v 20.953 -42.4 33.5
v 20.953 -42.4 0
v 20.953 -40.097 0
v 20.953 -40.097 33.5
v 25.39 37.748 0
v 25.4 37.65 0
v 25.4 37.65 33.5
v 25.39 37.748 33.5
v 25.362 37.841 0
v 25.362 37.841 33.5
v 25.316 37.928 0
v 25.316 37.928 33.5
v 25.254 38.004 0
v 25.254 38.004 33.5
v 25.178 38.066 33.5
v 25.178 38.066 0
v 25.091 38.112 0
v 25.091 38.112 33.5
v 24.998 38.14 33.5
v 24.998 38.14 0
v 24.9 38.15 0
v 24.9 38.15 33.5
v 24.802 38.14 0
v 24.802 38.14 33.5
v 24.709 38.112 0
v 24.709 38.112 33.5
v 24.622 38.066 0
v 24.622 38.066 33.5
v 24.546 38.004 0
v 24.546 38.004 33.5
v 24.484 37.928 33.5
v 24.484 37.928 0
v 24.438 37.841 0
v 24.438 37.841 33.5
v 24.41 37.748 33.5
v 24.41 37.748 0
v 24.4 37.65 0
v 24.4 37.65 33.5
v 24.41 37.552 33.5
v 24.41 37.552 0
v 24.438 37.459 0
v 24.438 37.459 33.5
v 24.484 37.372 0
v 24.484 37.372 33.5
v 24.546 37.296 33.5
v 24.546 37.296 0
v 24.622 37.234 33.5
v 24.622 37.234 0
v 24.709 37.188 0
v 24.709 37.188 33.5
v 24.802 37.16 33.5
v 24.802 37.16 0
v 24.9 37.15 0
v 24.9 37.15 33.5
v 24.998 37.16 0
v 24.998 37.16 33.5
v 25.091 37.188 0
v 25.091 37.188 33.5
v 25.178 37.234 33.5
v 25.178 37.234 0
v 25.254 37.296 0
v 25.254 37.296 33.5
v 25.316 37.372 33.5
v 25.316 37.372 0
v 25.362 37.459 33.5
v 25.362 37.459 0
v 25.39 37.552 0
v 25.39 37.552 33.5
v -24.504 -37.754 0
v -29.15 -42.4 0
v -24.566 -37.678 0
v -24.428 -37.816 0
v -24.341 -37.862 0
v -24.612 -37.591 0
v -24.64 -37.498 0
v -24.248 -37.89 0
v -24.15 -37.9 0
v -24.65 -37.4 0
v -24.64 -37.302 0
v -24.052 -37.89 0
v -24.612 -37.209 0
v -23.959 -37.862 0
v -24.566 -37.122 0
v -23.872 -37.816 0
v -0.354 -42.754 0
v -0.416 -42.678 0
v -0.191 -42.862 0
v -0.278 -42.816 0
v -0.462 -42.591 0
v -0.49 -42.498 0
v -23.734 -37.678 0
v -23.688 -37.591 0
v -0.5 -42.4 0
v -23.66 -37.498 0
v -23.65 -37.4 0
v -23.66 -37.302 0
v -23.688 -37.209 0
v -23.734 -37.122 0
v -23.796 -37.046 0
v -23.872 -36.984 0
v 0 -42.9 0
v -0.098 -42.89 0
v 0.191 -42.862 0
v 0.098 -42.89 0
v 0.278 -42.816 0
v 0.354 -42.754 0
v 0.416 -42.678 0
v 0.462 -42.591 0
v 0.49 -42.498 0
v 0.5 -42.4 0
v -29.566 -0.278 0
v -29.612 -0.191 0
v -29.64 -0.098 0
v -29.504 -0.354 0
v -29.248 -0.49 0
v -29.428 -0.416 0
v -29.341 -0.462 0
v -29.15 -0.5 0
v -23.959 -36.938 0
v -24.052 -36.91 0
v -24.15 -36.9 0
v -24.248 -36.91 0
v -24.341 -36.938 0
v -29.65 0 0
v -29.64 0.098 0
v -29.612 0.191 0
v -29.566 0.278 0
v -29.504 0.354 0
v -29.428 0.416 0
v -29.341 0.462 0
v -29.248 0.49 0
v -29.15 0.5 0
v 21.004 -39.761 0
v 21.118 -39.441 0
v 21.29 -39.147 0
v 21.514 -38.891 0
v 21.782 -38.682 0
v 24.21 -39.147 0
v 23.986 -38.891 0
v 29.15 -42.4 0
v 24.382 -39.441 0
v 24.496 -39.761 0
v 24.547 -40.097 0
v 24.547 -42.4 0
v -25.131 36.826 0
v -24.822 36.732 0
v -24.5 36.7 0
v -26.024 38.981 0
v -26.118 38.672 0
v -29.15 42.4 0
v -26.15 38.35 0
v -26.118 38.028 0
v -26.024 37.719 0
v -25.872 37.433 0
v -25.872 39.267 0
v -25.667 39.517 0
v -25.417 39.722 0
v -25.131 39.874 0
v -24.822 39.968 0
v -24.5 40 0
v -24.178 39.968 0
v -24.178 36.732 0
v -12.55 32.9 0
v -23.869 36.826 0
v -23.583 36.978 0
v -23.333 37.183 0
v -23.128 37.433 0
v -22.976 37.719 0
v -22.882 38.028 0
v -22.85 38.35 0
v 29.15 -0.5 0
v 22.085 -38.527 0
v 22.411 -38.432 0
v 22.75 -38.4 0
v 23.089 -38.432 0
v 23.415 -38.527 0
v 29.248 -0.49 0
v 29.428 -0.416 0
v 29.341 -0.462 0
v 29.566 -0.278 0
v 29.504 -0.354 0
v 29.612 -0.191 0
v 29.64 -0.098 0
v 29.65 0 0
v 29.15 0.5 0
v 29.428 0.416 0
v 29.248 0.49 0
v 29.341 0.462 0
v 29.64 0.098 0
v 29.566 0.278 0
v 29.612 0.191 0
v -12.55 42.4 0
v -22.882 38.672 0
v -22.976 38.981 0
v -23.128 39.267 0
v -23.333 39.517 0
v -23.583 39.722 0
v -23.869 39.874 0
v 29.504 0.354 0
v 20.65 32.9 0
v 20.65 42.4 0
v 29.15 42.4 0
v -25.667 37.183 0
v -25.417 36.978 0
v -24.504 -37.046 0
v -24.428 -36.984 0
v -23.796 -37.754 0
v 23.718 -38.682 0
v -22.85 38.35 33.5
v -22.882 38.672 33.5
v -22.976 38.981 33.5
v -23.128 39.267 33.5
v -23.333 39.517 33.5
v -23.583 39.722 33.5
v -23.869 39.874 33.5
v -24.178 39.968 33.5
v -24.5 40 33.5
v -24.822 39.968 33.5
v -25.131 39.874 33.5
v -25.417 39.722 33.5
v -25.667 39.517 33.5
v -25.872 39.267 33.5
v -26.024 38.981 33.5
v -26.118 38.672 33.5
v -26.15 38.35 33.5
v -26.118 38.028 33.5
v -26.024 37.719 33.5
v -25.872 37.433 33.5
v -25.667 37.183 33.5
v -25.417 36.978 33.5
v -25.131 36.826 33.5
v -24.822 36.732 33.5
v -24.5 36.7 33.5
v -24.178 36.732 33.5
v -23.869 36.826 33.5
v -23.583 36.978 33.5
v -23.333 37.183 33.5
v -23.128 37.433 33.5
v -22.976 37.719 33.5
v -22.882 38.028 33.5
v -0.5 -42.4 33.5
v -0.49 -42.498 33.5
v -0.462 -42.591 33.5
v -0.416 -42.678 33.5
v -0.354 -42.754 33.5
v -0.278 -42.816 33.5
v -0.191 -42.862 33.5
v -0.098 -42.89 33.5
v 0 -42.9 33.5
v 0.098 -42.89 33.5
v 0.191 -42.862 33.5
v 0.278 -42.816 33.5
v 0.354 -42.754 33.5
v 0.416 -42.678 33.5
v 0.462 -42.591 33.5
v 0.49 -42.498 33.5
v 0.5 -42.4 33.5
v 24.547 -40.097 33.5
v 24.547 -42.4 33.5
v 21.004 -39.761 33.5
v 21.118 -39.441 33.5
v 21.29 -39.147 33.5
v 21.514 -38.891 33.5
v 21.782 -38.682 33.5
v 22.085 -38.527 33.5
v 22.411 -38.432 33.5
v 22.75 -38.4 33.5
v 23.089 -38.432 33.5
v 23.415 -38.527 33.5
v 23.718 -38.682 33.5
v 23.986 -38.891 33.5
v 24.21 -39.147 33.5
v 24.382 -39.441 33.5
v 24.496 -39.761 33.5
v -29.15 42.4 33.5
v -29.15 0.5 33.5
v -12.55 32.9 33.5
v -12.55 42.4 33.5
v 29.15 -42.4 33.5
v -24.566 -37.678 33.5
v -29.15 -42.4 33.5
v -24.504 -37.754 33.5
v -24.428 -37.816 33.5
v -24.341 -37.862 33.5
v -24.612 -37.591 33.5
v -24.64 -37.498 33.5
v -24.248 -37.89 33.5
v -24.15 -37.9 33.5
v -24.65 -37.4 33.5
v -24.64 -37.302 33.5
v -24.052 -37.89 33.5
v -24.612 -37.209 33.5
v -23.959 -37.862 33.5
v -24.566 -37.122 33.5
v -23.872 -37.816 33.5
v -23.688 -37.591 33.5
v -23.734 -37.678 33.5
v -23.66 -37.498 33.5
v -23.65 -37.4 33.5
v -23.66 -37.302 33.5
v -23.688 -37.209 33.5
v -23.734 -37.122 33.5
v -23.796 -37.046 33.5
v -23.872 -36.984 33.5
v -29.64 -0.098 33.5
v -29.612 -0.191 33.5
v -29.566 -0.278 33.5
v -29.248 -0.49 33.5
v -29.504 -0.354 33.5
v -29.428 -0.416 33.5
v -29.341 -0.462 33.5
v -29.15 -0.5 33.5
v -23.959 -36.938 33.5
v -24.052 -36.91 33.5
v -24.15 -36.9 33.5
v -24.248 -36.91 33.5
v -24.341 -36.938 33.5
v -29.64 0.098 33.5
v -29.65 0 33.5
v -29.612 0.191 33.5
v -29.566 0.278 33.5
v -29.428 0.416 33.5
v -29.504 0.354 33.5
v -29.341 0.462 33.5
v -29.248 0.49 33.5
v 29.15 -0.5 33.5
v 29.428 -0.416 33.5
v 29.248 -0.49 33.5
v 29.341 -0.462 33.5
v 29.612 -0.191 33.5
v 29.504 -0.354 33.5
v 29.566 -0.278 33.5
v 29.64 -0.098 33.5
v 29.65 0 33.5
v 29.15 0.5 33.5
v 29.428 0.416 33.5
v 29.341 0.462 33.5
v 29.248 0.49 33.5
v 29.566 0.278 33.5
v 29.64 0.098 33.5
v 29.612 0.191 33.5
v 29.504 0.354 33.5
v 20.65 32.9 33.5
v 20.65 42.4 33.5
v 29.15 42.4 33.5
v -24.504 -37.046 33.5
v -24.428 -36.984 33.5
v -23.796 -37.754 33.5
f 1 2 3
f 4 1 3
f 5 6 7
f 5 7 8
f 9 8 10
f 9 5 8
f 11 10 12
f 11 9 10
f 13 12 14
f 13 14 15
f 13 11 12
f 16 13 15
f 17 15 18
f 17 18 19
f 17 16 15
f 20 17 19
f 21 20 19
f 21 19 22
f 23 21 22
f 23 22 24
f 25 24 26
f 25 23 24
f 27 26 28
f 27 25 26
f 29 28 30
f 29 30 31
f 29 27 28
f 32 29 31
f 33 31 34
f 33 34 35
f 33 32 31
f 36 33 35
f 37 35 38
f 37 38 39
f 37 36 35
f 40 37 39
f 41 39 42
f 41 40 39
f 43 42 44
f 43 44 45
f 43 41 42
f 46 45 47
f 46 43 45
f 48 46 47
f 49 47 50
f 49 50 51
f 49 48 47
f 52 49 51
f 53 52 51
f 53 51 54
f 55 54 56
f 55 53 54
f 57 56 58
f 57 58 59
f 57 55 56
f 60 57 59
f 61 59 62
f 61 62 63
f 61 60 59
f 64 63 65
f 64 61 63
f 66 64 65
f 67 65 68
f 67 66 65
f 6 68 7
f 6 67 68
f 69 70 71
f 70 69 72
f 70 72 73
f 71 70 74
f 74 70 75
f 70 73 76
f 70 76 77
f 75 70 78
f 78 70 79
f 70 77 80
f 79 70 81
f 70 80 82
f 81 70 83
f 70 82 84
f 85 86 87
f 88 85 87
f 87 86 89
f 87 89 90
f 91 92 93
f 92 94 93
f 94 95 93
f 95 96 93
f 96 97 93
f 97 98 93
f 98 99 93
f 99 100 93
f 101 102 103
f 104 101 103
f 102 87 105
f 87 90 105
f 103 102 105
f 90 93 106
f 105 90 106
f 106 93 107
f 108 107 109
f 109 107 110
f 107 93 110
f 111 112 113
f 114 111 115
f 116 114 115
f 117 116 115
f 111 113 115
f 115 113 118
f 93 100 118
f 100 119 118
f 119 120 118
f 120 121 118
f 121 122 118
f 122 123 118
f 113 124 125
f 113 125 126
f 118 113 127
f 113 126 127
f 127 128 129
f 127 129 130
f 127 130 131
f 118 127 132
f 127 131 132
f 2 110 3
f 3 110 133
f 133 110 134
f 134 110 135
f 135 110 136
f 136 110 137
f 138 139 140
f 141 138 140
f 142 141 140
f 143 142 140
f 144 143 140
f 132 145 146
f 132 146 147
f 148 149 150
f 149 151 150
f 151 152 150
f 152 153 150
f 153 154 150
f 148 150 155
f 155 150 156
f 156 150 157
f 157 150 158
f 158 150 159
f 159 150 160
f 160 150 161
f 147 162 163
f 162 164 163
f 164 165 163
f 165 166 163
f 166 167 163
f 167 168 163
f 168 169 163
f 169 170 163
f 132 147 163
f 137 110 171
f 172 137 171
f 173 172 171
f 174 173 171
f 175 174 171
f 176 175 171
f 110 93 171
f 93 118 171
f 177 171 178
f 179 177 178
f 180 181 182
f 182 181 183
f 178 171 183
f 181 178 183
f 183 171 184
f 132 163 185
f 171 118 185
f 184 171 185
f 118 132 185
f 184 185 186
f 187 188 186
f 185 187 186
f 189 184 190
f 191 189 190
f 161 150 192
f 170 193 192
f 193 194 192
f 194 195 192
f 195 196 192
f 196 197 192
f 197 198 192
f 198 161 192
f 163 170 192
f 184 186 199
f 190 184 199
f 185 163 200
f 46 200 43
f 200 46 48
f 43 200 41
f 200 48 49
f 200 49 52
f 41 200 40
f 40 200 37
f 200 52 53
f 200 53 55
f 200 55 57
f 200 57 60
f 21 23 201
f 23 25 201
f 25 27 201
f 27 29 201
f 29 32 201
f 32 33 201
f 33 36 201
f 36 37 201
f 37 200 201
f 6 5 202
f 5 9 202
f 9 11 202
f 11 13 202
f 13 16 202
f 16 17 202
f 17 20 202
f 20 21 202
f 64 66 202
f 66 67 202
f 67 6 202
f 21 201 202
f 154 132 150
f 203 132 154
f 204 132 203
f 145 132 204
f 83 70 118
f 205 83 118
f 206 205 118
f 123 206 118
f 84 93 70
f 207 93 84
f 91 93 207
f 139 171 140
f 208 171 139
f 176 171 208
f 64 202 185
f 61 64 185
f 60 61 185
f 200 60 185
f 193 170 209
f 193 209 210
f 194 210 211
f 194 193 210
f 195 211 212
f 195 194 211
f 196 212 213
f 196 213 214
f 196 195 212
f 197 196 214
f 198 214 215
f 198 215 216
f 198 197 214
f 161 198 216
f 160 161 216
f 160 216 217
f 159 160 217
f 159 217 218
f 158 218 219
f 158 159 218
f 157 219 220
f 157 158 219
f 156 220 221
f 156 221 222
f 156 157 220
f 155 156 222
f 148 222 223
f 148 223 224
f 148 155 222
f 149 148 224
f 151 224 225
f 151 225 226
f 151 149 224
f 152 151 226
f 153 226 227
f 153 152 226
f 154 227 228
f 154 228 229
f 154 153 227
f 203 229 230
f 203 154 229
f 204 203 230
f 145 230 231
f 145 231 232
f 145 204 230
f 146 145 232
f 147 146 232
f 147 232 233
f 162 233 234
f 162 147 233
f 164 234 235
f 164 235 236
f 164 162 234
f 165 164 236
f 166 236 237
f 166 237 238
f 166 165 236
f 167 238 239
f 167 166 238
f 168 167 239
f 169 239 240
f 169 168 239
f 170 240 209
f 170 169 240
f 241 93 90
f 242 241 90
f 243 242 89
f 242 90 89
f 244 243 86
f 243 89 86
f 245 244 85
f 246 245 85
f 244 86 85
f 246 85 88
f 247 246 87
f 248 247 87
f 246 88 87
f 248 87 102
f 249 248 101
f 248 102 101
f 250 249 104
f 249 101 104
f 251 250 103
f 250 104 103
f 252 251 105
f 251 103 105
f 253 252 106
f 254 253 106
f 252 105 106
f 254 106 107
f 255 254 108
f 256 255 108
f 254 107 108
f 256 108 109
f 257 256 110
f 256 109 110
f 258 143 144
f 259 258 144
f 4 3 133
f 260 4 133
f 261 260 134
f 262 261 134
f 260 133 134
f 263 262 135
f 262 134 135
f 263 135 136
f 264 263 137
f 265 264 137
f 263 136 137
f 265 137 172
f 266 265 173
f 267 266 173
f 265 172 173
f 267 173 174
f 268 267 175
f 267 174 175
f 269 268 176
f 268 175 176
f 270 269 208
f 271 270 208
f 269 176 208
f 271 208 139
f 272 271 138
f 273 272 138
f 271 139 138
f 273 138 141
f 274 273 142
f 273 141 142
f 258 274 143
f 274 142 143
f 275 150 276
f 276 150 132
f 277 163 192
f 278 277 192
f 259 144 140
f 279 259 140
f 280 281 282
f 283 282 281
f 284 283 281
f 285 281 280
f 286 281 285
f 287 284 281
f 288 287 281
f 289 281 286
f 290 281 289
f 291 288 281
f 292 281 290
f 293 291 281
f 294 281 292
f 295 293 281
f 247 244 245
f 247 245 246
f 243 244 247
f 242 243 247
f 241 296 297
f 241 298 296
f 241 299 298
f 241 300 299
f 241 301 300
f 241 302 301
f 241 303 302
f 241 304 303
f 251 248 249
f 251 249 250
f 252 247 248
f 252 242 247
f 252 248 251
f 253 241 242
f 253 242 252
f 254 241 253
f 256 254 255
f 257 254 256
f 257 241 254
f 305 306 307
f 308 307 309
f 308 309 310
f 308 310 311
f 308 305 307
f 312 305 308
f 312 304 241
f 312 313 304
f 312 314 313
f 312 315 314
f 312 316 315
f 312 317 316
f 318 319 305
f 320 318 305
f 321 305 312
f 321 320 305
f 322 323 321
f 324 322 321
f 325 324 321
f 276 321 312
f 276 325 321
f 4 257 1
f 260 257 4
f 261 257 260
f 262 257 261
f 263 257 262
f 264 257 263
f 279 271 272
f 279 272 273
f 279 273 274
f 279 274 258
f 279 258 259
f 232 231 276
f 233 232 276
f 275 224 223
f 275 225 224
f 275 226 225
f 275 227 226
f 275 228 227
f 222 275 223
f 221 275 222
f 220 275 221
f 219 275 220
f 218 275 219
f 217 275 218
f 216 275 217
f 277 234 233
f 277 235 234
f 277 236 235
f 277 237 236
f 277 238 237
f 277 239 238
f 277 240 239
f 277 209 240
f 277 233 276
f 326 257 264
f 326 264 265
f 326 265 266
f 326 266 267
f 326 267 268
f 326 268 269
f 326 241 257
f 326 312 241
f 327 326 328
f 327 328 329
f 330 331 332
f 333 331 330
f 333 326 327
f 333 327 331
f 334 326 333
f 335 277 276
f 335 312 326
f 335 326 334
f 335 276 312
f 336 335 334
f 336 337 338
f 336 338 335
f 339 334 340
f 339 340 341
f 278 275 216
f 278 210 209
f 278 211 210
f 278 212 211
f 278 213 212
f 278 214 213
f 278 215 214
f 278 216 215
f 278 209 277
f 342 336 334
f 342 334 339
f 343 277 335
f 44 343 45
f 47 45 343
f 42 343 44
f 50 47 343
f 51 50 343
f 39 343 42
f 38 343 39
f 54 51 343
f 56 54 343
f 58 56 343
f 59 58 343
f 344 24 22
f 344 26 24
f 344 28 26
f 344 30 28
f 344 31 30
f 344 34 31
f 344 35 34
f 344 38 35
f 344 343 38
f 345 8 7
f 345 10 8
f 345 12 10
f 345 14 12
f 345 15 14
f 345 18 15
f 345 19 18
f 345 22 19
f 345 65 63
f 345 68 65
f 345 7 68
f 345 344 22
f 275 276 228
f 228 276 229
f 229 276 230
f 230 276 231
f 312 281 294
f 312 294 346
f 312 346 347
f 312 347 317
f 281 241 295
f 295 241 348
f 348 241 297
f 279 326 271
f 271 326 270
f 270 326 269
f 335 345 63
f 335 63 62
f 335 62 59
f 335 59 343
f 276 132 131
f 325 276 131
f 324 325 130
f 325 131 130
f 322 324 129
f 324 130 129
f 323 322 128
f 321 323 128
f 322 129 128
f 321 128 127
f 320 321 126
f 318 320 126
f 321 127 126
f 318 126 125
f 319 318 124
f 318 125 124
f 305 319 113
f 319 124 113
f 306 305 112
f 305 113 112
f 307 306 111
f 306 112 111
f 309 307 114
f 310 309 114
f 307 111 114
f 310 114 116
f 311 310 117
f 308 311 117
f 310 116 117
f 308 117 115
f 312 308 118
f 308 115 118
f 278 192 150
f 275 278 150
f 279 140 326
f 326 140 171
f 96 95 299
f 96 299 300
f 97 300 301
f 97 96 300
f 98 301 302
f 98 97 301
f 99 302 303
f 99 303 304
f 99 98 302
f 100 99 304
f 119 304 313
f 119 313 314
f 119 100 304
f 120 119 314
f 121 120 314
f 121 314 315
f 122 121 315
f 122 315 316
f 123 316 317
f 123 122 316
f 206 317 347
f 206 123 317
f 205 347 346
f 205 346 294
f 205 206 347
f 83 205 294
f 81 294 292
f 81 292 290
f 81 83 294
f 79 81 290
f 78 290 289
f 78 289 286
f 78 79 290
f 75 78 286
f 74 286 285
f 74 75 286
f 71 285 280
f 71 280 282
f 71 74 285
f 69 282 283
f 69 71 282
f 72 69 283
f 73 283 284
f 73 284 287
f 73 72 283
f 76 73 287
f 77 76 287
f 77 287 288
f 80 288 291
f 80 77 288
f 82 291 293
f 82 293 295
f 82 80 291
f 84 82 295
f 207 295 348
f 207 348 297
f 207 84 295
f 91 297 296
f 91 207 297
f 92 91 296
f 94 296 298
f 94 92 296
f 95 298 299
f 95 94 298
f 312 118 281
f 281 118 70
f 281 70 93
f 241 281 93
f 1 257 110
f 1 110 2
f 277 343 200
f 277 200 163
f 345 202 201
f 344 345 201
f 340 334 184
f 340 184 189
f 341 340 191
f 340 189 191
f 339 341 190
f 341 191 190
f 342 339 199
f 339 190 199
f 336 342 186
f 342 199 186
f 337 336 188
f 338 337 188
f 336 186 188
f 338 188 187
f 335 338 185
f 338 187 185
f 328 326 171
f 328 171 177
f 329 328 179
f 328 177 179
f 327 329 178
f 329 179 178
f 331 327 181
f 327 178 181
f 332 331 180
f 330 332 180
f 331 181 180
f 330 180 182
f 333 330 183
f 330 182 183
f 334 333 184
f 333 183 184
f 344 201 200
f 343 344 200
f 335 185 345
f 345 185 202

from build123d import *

# Parameters (mm, degrees)
F0_R     = 0.5
F0_R_2   = 1.65
F1_DEPTH = 33.5


with BuildPart() as f1:
    # F0 (on Top) → F1 (new body)
    with BuildSketch(Plane.XY):
        with BuildLine():
            Line((-12.55, 42.4), (-29.15, 42.4))
            Line((-29.15, 42.4), (-29.15, 0.5))
            ThreePointArc((-29.15, 0.5), (-28.7964466094, 0.3535533906), (-28.65, 0))
            ThreePointArc((-28.65, 0), (-28.7964466094, -0.3535533906), (-29.15, -0.5))
            Line((-29.15, -0.5), (-29.15, -42.4))
            Line((-29.15, -42.4), (-0.5, -42.4))
            ThreePointArc((-0.5, -42.4), (0, -41.9), (0.5, -42.4))
            Line((0.5, -42.4), (20.9529261778, -42.4))
            Line((20.9529261778, -42.4), (20.9529261778, -40.0974052754))
            ThreePointArc((20.9529261778, -40.0974052754), (22.75, -38.4), (24.5470738222, -40.0974052754))
            Line((24.5470738222, -40.0974052754), (24.5470738222, -42.4))
            Line((24.5470738222, -42.4), (29.15, -42.4))
            Line((29.15, -42.4), (29.15, -0.5))
            ThreePointArc((29.15, -0.5), (28.65, 0), (29.15, 0.5))
            Line((29.15, 0.5), (29.15, 42.4))
            Line((29.15, 42.4), (20.65, 42.4))
            Line((20.65, 42.4), (20.65, 32.9))
            Line((20.65, 32.9), (-12.55, 32.9))
            Line((-12.55, 32.9), (-12.55, 42.2510281205))
            Line((-12.55, 42.2510281205), (-12.55, 42.4))
        make_face()
        with Locations((-24.15, -37.4)):
            Circle(F0_R, mode=Mode.SUBTRACT)
        with Locations((-24.5, 38.35)):
            Circle(F0_R_2, mode=Mode.SUBTRACT)
        with Locations((24.9, 37.65)):
            Circle(F0_R, mode=Mode.SUBTRACT)
        with BuildLine():
            ThreePointArc((-28.65, 0), (-28.7964466094, 0.3535533906), (-29.15, 0.5))
            Line((-29.15, 0.5), (-29.15, -0.5))
            ThreePointArc((-29.15, -0.5), (-28.7964466094, -0.3535533906), (-28.65, 0))
        make_face()
        with BuildLine():
            Line((-29.15, -0.5), (-29.15, 0.5))
            ThreePointArc((-29.15, 0.5), (-29.65, 0), (-29.15, -0.5))
        make_face()
        with BuildLine():
            ThreePointArc((0.5, -42.4), (0, -41.9), (-0.5, -42.4))
            Line((-0.5, -42.4), (0.5, -42.4))
        make_face()
        with BuildLine():
            Line((0.5, -42.4), (-0.5, -42.4))
            ThreePointArc((-0.5, -42.4), (0, -42.9), (0.5, -42.4))
        make_face()
        with BuildLine():
            ThreePointArc((29.65, 0), (29.5035533906, 0.3535533906), (29.15, 0.5))
            Line((29.15, 0.5), (29.15, -0.5))
            ThreePointArc((29.15, -0.5), (29.5035533906, -0.3535533906), (29.65, 0))
        make_face()
        with BuildLine():
            Line((29.15, -0.5), (29.15, 0.5))
            ThreePointArc((29.15, 0.5), (28.65, 0), (29.15, -0.5))
        make_face()
    extrude(amount=F1_DEPTH)


solid = f1.part
